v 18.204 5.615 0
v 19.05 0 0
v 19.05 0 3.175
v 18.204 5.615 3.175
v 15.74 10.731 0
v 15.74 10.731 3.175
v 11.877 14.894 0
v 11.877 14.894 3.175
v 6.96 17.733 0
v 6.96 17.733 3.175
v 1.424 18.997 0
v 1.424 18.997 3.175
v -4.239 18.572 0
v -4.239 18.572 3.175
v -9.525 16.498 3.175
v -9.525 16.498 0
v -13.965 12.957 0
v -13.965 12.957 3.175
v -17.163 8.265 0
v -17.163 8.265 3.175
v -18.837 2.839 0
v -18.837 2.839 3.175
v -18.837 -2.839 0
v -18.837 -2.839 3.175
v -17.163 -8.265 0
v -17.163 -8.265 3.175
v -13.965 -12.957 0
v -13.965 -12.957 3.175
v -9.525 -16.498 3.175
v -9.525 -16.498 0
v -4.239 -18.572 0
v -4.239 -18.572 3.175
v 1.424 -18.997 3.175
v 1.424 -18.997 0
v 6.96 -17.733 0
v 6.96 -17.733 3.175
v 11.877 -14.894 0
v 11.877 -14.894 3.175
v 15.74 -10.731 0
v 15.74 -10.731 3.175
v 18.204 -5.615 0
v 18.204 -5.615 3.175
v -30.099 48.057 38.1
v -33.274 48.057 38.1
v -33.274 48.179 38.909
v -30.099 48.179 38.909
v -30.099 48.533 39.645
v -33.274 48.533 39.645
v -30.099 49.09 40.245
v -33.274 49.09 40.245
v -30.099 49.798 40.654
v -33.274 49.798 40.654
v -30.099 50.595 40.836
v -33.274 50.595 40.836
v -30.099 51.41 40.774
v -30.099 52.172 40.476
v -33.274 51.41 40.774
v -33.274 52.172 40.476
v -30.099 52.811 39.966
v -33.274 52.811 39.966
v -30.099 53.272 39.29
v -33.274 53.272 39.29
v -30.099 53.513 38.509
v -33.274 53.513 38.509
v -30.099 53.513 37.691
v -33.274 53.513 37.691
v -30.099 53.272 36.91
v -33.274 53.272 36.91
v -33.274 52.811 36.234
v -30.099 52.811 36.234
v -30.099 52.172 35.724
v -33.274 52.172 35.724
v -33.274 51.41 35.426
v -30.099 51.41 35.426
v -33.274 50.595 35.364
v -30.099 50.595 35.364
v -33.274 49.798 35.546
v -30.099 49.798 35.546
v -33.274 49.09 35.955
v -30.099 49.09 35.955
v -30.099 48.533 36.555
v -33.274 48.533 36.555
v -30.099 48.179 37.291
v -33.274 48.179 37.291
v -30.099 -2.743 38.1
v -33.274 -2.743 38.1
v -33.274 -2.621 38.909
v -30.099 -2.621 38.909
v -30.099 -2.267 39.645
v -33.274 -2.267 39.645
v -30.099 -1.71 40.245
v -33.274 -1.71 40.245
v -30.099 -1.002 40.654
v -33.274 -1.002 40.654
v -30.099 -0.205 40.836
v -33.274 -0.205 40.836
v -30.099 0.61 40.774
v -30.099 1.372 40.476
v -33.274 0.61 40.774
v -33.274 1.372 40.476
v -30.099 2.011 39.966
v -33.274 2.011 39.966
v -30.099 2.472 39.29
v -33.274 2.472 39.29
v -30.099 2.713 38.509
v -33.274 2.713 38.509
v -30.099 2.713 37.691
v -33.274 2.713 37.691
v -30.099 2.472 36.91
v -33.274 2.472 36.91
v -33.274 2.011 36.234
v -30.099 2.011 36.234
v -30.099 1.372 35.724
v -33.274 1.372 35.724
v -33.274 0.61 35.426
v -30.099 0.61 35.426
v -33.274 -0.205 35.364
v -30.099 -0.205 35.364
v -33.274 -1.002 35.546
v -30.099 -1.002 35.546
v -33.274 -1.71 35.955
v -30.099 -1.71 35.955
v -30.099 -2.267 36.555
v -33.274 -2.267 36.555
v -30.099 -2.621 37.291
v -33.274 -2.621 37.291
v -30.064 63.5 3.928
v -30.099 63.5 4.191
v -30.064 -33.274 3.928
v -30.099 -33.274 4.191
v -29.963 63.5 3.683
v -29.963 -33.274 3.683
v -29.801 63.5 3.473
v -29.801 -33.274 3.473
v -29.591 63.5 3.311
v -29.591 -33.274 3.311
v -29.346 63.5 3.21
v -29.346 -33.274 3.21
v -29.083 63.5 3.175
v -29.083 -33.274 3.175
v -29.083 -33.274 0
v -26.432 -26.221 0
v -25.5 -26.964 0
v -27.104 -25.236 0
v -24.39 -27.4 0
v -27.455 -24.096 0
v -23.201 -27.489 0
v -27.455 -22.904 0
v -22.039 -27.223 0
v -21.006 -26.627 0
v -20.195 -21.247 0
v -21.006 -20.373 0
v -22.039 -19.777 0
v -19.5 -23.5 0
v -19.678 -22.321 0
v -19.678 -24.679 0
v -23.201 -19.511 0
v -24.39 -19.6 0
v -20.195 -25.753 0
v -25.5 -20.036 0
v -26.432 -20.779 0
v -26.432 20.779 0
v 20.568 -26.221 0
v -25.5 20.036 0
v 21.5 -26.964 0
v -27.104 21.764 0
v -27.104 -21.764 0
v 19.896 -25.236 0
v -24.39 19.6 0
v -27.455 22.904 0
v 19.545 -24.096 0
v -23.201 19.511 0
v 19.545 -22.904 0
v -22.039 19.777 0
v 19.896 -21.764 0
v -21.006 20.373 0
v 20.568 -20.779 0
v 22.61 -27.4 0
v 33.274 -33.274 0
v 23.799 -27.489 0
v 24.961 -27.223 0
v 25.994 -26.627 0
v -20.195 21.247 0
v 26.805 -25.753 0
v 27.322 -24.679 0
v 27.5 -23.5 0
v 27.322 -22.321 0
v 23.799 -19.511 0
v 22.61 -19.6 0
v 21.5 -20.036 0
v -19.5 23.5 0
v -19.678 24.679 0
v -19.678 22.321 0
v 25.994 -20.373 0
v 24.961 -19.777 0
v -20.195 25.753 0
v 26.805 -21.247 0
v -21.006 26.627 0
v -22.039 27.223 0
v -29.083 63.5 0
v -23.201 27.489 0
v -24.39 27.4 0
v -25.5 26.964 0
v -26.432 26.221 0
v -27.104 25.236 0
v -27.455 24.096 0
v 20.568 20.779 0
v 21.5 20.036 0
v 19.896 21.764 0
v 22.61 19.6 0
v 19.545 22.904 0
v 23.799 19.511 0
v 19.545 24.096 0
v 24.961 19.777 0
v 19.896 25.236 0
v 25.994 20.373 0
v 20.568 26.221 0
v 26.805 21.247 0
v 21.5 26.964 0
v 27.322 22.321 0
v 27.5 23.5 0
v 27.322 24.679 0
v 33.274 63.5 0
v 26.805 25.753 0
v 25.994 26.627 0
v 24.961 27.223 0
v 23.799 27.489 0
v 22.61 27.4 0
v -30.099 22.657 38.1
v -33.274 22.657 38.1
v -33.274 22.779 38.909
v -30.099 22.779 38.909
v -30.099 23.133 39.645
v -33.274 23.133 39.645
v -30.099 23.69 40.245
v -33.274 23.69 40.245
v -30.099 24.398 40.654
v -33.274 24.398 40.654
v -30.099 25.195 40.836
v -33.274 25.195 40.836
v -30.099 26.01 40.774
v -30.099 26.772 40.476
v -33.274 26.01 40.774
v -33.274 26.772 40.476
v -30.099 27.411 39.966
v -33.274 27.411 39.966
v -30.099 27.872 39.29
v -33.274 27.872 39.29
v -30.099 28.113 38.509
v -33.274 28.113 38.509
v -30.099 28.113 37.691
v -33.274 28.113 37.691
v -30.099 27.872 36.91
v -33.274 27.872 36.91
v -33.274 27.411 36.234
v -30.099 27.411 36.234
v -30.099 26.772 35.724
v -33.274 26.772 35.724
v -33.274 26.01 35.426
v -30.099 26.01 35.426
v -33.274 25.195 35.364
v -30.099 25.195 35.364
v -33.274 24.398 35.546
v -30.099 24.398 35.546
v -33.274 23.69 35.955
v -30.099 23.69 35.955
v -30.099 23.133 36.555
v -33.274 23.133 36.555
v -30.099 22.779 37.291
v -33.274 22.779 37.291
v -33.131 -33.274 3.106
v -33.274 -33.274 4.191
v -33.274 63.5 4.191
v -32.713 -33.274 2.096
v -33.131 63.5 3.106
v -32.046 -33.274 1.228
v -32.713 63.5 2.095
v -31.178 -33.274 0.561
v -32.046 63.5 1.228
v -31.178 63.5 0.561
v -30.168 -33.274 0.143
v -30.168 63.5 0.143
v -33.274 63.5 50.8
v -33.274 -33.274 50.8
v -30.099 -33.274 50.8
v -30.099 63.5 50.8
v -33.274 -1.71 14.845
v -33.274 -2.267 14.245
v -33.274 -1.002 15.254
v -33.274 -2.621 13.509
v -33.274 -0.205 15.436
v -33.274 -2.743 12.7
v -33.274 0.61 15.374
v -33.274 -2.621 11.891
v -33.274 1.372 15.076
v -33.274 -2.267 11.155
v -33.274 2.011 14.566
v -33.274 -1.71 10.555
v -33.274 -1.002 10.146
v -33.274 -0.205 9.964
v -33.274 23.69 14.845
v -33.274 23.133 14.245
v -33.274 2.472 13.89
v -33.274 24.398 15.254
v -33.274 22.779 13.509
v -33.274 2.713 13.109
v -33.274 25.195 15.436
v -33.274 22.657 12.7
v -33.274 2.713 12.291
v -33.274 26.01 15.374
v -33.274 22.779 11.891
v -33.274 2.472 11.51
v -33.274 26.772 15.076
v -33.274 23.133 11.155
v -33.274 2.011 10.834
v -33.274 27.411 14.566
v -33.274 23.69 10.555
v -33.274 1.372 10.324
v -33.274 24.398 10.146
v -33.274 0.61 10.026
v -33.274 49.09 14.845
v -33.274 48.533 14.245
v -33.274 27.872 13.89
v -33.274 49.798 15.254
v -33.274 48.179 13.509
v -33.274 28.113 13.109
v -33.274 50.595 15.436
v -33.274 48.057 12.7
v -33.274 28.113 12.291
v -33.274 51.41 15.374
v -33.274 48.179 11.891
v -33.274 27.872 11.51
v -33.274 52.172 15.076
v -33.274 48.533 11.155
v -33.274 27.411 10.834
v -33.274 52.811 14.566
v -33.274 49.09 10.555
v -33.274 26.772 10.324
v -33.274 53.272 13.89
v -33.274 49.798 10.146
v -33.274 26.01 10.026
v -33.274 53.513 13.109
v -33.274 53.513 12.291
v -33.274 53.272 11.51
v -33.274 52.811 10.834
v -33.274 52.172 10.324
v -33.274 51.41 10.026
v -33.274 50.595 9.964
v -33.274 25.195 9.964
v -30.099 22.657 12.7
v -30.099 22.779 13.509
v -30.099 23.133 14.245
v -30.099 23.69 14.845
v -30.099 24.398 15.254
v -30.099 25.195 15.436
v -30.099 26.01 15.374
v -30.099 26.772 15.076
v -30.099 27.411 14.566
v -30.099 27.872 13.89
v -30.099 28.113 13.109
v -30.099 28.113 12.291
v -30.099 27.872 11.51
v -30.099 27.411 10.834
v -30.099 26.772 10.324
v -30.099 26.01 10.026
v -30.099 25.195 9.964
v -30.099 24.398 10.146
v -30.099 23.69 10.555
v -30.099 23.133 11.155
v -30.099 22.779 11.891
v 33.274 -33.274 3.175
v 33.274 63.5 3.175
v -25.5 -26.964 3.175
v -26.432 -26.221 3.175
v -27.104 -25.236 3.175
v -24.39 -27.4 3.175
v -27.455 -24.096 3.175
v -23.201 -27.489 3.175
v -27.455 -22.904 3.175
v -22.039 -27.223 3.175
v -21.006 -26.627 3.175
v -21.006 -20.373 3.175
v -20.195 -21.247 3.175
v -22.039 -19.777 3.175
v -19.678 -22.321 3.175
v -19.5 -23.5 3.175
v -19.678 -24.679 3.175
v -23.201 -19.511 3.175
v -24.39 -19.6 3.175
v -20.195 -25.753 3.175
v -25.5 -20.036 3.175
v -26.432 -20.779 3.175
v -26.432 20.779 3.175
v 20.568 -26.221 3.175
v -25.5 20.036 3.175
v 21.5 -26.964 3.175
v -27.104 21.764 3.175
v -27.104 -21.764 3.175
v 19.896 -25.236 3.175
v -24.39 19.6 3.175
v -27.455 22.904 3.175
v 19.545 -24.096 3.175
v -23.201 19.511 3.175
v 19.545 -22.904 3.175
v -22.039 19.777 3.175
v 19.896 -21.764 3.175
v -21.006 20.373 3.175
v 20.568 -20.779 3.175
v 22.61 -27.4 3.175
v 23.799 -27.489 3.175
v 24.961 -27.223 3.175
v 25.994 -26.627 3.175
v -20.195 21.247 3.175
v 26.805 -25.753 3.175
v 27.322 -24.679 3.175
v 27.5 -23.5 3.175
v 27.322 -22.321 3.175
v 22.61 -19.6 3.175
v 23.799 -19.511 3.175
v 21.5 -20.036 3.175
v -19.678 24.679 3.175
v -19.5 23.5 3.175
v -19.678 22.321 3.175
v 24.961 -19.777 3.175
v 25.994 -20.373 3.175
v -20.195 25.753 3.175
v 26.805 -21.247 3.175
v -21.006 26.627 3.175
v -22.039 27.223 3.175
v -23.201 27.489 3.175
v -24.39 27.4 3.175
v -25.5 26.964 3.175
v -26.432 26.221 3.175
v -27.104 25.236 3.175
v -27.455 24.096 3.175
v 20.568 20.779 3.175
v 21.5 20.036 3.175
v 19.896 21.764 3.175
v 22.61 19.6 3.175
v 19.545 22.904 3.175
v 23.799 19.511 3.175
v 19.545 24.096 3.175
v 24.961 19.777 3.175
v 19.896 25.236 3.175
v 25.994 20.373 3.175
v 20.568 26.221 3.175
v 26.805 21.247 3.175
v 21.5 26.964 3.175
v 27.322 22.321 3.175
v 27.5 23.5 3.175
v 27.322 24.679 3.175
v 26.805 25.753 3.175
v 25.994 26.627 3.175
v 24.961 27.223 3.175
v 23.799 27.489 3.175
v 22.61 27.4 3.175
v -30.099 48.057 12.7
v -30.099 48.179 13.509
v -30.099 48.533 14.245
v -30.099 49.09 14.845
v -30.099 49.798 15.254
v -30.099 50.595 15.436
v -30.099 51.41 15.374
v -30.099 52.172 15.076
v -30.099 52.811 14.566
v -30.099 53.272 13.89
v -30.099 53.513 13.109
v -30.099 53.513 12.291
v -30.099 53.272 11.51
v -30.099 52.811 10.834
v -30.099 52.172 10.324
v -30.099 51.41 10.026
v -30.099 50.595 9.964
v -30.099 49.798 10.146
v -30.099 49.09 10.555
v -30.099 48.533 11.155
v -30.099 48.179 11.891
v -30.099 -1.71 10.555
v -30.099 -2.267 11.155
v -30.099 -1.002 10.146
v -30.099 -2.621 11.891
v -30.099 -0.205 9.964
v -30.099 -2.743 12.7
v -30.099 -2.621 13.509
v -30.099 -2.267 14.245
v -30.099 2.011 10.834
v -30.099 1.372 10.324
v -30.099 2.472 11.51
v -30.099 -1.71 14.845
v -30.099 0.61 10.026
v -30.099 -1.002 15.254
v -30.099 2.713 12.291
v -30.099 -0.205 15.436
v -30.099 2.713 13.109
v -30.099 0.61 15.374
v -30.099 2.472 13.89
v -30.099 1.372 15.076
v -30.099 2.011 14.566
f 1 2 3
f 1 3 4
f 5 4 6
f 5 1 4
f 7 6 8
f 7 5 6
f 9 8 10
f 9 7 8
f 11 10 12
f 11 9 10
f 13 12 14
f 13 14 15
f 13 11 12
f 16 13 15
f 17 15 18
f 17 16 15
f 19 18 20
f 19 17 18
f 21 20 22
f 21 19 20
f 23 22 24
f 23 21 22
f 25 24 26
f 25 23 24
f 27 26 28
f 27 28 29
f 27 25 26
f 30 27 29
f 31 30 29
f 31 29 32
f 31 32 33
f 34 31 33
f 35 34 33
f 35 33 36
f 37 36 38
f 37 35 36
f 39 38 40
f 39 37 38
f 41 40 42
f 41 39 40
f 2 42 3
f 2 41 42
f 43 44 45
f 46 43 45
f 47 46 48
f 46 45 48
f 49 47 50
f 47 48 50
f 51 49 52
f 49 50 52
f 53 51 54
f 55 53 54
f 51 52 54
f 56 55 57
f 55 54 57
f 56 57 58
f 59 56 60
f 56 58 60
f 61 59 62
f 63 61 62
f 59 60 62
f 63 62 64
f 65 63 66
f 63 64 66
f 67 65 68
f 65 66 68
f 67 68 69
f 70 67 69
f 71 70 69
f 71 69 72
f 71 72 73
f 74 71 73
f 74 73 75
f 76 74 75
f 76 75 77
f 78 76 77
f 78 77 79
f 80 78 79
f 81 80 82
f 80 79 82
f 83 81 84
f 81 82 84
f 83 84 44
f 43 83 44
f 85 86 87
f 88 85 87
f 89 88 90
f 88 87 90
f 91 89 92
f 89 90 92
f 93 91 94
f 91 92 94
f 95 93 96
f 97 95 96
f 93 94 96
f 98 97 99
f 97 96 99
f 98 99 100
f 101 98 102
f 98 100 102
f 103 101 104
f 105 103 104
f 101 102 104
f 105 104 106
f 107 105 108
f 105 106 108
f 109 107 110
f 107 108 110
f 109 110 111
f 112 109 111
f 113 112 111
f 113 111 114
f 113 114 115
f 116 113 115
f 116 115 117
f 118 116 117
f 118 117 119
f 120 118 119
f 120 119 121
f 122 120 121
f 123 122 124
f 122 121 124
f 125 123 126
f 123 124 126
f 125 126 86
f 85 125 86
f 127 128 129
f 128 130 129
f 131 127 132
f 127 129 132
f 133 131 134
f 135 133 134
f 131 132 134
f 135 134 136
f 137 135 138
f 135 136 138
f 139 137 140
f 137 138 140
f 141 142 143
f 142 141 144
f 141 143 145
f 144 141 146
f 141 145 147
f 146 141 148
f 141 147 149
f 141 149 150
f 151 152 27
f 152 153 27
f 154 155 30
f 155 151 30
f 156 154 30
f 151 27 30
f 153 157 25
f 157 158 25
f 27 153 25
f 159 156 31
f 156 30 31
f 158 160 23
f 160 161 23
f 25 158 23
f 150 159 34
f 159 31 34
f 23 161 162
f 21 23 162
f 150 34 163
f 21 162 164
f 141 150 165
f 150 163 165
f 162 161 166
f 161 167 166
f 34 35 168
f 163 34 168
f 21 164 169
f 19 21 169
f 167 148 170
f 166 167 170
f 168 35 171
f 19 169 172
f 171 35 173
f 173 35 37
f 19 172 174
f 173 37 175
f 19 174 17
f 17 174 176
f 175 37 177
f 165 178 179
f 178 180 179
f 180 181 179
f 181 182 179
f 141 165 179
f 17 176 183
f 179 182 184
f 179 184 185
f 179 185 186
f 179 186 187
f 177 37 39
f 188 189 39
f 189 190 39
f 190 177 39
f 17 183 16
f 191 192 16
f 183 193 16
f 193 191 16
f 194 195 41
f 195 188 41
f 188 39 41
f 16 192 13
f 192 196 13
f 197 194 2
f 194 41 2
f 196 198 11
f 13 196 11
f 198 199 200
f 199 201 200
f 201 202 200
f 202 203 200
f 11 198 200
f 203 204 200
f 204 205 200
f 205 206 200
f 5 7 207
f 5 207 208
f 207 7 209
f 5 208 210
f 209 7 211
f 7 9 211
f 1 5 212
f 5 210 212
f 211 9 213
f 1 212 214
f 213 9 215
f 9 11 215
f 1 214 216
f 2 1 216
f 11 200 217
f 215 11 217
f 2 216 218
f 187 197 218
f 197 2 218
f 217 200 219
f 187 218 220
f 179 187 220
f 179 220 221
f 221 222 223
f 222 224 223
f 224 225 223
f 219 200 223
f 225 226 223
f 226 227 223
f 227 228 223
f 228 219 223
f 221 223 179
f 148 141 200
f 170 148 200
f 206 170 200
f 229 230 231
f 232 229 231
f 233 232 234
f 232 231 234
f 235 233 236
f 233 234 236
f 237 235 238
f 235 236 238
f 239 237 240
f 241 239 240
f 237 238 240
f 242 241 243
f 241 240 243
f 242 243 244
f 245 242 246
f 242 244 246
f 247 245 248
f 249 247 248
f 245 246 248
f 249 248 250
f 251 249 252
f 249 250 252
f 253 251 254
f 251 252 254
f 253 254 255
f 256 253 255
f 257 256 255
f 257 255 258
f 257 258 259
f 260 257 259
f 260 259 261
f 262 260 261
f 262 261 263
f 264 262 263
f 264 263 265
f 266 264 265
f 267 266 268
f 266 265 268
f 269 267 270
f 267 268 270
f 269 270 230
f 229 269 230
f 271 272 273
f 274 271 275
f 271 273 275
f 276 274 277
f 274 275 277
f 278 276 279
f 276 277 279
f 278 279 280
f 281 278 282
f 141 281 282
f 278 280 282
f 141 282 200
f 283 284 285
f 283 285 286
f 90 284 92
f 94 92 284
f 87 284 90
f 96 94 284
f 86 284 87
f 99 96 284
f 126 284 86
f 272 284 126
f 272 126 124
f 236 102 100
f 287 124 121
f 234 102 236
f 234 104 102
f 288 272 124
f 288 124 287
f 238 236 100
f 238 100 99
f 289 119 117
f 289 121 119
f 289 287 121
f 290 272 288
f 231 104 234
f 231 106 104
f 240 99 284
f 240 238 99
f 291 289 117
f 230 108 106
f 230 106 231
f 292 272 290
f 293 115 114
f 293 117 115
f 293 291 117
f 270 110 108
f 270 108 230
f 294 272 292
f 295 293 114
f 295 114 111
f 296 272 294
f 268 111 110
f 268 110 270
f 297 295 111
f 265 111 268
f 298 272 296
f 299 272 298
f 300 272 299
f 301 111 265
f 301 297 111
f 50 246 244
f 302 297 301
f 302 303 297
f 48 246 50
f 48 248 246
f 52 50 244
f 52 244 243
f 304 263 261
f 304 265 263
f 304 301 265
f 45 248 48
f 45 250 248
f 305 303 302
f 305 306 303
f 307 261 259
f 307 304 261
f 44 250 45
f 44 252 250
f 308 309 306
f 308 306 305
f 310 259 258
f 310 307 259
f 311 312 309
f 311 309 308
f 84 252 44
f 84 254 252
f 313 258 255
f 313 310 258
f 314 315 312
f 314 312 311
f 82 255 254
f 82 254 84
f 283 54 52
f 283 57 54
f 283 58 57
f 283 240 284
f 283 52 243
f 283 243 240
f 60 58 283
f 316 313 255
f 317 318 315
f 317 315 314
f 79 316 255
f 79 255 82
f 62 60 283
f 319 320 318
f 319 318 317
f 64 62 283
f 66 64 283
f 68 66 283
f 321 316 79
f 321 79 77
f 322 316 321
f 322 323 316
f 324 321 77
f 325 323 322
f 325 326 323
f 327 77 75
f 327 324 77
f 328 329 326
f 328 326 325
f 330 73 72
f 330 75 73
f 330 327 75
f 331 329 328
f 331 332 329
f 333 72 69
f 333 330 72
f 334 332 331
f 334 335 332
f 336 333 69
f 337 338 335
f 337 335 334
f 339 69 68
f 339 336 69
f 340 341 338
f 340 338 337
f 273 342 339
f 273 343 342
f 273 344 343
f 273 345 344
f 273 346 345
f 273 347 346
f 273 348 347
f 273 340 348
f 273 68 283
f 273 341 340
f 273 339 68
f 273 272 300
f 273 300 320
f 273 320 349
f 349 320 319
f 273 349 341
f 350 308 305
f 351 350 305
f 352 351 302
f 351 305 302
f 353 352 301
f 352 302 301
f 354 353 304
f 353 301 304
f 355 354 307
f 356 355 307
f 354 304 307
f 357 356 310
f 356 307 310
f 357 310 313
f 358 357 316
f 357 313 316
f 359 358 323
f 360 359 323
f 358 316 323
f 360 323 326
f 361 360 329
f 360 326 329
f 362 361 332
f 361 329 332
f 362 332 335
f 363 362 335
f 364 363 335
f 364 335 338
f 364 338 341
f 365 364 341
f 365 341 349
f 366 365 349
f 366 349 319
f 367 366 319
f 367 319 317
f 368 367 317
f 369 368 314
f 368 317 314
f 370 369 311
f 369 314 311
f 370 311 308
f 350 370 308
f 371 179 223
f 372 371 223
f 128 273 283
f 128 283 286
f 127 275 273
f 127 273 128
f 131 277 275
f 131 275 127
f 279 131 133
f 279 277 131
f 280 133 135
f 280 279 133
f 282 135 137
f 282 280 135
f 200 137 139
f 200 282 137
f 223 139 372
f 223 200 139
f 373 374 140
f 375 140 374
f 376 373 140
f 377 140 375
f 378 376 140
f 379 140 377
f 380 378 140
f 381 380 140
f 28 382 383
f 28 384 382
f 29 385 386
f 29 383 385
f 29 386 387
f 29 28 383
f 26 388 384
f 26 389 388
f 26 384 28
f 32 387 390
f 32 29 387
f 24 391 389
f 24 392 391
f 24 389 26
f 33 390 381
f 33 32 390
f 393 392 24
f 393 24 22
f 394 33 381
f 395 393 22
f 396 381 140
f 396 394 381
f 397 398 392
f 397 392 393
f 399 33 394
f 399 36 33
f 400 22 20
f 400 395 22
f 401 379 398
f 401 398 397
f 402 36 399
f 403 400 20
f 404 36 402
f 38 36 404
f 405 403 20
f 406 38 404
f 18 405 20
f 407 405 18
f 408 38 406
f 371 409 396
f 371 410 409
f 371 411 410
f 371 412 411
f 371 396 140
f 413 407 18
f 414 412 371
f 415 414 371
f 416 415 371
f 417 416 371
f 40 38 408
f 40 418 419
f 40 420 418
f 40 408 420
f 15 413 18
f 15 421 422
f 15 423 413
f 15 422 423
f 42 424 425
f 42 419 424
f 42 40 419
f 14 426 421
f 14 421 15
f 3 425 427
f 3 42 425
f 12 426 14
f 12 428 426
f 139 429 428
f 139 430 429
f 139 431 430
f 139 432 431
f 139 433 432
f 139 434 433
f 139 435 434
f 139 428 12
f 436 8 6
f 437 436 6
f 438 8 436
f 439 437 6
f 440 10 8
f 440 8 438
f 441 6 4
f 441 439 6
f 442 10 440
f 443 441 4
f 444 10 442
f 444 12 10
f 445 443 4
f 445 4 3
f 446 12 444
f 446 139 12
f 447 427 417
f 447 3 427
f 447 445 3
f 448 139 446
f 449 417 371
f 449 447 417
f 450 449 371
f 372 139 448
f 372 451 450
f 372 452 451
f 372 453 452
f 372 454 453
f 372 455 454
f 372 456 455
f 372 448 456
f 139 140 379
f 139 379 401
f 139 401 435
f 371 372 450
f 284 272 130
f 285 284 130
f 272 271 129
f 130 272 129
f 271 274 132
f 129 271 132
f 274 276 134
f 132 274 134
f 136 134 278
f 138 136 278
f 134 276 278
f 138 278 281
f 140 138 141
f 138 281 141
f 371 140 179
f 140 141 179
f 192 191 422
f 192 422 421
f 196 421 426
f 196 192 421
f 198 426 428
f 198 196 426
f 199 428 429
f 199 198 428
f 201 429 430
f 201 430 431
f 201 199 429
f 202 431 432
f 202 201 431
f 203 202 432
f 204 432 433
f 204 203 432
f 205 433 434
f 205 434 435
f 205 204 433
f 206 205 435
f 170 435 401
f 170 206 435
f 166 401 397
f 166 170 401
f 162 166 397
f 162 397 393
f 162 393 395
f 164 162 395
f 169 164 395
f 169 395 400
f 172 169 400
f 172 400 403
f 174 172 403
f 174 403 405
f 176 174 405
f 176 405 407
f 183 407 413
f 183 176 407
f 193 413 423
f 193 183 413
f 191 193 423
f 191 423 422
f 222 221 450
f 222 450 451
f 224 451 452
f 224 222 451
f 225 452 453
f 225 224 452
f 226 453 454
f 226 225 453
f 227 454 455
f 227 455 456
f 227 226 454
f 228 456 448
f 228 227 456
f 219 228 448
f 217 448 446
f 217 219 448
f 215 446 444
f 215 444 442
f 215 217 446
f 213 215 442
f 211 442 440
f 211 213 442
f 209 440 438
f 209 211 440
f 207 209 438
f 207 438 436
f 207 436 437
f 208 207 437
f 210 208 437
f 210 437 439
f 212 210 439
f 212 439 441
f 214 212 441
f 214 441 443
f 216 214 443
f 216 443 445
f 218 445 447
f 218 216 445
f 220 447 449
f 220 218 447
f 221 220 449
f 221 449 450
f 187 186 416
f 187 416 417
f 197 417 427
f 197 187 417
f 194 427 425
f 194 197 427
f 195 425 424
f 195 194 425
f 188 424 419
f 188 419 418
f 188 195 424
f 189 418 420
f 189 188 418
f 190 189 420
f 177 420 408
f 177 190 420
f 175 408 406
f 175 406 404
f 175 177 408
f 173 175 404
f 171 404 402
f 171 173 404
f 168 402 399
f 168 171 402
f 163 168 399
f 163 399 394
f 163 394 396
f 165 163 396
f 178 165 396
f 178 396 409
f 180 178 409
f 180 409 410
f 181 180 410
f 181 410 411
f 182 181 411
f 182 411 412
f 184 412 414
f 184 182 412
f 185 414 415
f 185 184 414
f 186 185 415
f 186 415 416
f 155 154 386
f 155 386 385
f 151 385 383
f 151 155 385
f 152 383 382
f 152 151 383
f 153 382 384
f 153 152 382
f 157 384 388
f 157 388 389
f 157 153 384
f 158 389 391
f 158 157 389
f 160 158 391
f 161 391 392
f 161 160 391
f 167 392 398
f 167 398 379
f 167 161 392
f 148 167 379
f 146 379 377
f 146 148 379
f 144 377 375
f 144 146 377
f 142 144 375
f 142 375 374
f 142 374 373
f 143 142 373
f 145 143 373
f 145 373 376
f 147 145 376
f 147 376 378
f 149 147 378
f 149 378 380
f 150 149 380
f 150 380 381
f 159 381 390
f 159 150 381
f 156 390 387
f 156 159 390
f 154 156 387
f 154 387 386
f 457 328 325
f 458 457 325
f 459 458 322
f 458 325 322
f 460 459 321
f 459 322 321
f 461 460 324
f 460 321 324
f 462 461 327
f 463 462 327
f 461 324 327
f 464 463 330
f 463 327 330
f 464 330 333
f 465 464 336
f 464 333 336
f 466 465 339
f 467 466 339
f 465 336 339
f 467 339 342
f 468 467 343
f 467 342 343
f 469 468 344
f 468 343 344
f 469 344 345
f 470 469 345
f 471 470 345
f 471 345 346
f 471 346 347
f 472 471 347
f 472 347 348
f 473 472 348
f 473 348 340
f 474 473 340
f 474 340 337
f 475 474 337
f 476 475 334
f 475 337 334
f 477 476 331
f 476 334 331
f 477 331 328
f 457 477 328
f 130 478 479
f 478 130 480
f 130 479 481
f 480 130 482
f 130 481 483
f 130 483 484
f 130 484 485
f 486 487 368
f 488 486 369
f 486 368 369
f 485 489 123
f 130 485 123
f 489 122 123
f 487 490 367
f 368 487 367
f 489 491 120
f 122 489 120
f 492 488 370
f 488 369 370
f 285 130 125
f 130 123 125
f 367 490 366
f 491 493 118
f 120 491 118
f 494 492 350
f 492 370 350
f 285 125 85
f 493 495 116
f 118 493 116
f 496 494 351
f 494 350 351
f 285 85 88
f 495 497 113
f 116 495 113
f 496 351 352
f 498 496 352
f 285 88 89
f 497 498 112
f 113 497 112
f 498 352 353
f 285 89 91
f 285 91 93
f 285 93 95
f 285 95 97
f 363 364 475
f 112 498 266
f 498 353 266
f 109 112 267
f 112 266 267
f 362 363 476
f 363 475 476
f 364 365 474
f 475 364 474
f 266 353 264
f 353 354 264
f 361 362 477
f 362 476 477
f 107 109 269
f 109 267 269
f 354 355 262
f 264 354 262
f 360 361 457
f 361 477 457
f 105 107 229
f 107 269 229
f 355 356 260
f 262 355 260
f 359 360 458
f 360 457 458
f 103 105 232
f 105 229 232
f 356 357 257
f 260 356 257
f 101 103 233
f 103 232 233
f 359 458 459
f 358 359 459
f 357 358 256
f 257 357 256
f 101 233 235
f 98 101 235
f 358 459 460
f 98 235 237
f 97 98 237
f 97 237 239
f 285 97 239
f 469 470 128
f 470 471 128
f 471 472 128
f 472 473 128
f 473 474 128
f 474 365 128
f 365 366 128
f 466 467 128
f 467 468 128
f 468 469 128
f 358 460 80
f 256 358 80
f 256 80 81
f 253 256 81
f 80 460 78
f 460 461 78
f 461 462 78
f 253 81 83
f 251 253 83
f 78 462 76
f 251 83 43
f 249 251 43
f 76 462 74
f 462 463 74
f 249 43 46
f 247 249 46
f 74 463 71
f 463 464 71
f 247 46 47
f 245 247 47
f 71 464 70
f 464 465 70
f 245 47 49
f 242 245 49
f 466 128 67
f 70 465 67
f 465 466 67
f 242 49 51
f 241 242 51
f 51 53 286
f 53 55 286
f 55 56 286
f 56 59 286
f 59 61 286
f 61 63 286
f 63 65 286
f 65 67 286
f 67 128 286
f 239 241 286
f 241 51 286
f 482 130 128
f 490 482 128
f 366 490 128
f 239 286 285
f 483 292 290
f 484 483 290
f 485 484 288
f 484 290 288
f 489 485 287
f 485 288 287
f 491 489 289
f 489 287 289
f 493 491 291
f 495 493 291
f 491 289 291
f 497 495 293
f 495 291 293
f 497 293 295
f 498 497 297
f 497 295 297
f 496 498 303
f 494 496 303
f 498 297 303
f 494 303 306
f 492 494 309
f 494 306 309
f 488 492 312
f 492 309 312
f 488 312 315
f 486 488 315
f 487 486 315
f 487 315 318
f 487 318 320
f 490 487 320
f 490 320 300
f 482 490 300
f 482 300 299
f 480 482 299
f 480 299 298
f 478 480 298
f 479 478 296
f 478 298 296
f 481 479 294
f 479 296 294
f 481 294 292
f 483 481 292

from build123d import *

# Parameters (mm, degrees)
SKETCH1_W           = 66.548
SKETCH1_H           = 96.774
SKETCH1_R           = 19.05
SKETCH1_R_2         = 4
BOSS_EXTRUDE3_DEPTH = 3.175
SKETCH3_W           = 50.8
SKETCH3_H           = 96.774
SKETCH3_R           = 2.7432
BOSS_EXTRUDE4_DEPTH = 3.175
FILLET2_R           = 1.016
FILLET3_R           = 4.191


with BuildPart() as part:
    # Sketch1 → Boss-Extrude3 (new body)
    with BuildSketch(Plane.XY):
        with Locations((0, 15.113)):
            Rectangle(SKETCH1_W, SKETCH1_H)
        Circle(SKETCH1_R, mode=Mode.SUBTRACT)
        with Locations((23.5, 23.5)):
            Circle(SKETCH1_R_2, mode=Mode.SUBTRACT)
        with Locations((23.5, -23.5)):
            Circle(SKETCH1_R_2, mode=Mode.SUBTRACT)
        with Locations((-23.5, -23.5)):
            Circle(SKETCH1_R_2, mode=Mode.SUBTRACT)
        with Locations((-23.5, 23.5)):
            Circle(SKETCH1_R_2, mode=Mode.SUBTRACT)
    extrude(amount=BOSS_EXTRUDE3_DEPTH)

    # Sketch3 → Boss-Extrude4 (add)
    with BuildSketch(Plane.ZY.offset(33.274)):
        with Locations((25.4, 15.113)):
            Rectangle(SKETCH3_W, SKETCH3_H)
        with Locations(Location((38.1, 50.8, 0), (0, 0, 270))):
            Circle(SKETCH3_R, mode=Mode.SUBTRACT)
        with Locations(Location((12.7, 50.8, 0), (0, 0, 270))):
            Circle(SKETCH3_R, mode=Mode.SUBTRACT)
        with Locations(Location((38.1, 25.4, 0), (0, 0, 270))):
            Circle(SKETCH3_R, mode=Mode.SUBTRACT)
        with Locations(Location((12.7, 25.4, 0), (0, 0, 270))):
            Circle(SKETCH3_R, mode=Mode.SUBTRACT)
        with Locations(Location((38.1, 0, 0), (0, 0, 270))):
            Circle(SKETCH3_R, mode=Mode.SUBTRACT)
        with Locations(Location((12.7, 0, 0), (0, 0, 270))):
            Circle(SKETCH3_R, mode=Mode.SUBTRACT)
    extrude(amount=-BOSS_EXTRUDE4_DEPTH)

    # Fillet2
    fillet2_edges = [part.edges().sort_by_distance(p)[0] for p in [
        (-30.099, 15.113, 3.175),
    ]]
    fillet(fillet2_edges, radius=FILLET2_R)

    # Fillet3
    fillet3_edges = [part.edges().sort_by_distance(p)[0] for p in [
        (-33.274, 15.113, 0),
    ]]
    fillet(fillet3_edges, radius=FILLET3_R)


solid = part.part
